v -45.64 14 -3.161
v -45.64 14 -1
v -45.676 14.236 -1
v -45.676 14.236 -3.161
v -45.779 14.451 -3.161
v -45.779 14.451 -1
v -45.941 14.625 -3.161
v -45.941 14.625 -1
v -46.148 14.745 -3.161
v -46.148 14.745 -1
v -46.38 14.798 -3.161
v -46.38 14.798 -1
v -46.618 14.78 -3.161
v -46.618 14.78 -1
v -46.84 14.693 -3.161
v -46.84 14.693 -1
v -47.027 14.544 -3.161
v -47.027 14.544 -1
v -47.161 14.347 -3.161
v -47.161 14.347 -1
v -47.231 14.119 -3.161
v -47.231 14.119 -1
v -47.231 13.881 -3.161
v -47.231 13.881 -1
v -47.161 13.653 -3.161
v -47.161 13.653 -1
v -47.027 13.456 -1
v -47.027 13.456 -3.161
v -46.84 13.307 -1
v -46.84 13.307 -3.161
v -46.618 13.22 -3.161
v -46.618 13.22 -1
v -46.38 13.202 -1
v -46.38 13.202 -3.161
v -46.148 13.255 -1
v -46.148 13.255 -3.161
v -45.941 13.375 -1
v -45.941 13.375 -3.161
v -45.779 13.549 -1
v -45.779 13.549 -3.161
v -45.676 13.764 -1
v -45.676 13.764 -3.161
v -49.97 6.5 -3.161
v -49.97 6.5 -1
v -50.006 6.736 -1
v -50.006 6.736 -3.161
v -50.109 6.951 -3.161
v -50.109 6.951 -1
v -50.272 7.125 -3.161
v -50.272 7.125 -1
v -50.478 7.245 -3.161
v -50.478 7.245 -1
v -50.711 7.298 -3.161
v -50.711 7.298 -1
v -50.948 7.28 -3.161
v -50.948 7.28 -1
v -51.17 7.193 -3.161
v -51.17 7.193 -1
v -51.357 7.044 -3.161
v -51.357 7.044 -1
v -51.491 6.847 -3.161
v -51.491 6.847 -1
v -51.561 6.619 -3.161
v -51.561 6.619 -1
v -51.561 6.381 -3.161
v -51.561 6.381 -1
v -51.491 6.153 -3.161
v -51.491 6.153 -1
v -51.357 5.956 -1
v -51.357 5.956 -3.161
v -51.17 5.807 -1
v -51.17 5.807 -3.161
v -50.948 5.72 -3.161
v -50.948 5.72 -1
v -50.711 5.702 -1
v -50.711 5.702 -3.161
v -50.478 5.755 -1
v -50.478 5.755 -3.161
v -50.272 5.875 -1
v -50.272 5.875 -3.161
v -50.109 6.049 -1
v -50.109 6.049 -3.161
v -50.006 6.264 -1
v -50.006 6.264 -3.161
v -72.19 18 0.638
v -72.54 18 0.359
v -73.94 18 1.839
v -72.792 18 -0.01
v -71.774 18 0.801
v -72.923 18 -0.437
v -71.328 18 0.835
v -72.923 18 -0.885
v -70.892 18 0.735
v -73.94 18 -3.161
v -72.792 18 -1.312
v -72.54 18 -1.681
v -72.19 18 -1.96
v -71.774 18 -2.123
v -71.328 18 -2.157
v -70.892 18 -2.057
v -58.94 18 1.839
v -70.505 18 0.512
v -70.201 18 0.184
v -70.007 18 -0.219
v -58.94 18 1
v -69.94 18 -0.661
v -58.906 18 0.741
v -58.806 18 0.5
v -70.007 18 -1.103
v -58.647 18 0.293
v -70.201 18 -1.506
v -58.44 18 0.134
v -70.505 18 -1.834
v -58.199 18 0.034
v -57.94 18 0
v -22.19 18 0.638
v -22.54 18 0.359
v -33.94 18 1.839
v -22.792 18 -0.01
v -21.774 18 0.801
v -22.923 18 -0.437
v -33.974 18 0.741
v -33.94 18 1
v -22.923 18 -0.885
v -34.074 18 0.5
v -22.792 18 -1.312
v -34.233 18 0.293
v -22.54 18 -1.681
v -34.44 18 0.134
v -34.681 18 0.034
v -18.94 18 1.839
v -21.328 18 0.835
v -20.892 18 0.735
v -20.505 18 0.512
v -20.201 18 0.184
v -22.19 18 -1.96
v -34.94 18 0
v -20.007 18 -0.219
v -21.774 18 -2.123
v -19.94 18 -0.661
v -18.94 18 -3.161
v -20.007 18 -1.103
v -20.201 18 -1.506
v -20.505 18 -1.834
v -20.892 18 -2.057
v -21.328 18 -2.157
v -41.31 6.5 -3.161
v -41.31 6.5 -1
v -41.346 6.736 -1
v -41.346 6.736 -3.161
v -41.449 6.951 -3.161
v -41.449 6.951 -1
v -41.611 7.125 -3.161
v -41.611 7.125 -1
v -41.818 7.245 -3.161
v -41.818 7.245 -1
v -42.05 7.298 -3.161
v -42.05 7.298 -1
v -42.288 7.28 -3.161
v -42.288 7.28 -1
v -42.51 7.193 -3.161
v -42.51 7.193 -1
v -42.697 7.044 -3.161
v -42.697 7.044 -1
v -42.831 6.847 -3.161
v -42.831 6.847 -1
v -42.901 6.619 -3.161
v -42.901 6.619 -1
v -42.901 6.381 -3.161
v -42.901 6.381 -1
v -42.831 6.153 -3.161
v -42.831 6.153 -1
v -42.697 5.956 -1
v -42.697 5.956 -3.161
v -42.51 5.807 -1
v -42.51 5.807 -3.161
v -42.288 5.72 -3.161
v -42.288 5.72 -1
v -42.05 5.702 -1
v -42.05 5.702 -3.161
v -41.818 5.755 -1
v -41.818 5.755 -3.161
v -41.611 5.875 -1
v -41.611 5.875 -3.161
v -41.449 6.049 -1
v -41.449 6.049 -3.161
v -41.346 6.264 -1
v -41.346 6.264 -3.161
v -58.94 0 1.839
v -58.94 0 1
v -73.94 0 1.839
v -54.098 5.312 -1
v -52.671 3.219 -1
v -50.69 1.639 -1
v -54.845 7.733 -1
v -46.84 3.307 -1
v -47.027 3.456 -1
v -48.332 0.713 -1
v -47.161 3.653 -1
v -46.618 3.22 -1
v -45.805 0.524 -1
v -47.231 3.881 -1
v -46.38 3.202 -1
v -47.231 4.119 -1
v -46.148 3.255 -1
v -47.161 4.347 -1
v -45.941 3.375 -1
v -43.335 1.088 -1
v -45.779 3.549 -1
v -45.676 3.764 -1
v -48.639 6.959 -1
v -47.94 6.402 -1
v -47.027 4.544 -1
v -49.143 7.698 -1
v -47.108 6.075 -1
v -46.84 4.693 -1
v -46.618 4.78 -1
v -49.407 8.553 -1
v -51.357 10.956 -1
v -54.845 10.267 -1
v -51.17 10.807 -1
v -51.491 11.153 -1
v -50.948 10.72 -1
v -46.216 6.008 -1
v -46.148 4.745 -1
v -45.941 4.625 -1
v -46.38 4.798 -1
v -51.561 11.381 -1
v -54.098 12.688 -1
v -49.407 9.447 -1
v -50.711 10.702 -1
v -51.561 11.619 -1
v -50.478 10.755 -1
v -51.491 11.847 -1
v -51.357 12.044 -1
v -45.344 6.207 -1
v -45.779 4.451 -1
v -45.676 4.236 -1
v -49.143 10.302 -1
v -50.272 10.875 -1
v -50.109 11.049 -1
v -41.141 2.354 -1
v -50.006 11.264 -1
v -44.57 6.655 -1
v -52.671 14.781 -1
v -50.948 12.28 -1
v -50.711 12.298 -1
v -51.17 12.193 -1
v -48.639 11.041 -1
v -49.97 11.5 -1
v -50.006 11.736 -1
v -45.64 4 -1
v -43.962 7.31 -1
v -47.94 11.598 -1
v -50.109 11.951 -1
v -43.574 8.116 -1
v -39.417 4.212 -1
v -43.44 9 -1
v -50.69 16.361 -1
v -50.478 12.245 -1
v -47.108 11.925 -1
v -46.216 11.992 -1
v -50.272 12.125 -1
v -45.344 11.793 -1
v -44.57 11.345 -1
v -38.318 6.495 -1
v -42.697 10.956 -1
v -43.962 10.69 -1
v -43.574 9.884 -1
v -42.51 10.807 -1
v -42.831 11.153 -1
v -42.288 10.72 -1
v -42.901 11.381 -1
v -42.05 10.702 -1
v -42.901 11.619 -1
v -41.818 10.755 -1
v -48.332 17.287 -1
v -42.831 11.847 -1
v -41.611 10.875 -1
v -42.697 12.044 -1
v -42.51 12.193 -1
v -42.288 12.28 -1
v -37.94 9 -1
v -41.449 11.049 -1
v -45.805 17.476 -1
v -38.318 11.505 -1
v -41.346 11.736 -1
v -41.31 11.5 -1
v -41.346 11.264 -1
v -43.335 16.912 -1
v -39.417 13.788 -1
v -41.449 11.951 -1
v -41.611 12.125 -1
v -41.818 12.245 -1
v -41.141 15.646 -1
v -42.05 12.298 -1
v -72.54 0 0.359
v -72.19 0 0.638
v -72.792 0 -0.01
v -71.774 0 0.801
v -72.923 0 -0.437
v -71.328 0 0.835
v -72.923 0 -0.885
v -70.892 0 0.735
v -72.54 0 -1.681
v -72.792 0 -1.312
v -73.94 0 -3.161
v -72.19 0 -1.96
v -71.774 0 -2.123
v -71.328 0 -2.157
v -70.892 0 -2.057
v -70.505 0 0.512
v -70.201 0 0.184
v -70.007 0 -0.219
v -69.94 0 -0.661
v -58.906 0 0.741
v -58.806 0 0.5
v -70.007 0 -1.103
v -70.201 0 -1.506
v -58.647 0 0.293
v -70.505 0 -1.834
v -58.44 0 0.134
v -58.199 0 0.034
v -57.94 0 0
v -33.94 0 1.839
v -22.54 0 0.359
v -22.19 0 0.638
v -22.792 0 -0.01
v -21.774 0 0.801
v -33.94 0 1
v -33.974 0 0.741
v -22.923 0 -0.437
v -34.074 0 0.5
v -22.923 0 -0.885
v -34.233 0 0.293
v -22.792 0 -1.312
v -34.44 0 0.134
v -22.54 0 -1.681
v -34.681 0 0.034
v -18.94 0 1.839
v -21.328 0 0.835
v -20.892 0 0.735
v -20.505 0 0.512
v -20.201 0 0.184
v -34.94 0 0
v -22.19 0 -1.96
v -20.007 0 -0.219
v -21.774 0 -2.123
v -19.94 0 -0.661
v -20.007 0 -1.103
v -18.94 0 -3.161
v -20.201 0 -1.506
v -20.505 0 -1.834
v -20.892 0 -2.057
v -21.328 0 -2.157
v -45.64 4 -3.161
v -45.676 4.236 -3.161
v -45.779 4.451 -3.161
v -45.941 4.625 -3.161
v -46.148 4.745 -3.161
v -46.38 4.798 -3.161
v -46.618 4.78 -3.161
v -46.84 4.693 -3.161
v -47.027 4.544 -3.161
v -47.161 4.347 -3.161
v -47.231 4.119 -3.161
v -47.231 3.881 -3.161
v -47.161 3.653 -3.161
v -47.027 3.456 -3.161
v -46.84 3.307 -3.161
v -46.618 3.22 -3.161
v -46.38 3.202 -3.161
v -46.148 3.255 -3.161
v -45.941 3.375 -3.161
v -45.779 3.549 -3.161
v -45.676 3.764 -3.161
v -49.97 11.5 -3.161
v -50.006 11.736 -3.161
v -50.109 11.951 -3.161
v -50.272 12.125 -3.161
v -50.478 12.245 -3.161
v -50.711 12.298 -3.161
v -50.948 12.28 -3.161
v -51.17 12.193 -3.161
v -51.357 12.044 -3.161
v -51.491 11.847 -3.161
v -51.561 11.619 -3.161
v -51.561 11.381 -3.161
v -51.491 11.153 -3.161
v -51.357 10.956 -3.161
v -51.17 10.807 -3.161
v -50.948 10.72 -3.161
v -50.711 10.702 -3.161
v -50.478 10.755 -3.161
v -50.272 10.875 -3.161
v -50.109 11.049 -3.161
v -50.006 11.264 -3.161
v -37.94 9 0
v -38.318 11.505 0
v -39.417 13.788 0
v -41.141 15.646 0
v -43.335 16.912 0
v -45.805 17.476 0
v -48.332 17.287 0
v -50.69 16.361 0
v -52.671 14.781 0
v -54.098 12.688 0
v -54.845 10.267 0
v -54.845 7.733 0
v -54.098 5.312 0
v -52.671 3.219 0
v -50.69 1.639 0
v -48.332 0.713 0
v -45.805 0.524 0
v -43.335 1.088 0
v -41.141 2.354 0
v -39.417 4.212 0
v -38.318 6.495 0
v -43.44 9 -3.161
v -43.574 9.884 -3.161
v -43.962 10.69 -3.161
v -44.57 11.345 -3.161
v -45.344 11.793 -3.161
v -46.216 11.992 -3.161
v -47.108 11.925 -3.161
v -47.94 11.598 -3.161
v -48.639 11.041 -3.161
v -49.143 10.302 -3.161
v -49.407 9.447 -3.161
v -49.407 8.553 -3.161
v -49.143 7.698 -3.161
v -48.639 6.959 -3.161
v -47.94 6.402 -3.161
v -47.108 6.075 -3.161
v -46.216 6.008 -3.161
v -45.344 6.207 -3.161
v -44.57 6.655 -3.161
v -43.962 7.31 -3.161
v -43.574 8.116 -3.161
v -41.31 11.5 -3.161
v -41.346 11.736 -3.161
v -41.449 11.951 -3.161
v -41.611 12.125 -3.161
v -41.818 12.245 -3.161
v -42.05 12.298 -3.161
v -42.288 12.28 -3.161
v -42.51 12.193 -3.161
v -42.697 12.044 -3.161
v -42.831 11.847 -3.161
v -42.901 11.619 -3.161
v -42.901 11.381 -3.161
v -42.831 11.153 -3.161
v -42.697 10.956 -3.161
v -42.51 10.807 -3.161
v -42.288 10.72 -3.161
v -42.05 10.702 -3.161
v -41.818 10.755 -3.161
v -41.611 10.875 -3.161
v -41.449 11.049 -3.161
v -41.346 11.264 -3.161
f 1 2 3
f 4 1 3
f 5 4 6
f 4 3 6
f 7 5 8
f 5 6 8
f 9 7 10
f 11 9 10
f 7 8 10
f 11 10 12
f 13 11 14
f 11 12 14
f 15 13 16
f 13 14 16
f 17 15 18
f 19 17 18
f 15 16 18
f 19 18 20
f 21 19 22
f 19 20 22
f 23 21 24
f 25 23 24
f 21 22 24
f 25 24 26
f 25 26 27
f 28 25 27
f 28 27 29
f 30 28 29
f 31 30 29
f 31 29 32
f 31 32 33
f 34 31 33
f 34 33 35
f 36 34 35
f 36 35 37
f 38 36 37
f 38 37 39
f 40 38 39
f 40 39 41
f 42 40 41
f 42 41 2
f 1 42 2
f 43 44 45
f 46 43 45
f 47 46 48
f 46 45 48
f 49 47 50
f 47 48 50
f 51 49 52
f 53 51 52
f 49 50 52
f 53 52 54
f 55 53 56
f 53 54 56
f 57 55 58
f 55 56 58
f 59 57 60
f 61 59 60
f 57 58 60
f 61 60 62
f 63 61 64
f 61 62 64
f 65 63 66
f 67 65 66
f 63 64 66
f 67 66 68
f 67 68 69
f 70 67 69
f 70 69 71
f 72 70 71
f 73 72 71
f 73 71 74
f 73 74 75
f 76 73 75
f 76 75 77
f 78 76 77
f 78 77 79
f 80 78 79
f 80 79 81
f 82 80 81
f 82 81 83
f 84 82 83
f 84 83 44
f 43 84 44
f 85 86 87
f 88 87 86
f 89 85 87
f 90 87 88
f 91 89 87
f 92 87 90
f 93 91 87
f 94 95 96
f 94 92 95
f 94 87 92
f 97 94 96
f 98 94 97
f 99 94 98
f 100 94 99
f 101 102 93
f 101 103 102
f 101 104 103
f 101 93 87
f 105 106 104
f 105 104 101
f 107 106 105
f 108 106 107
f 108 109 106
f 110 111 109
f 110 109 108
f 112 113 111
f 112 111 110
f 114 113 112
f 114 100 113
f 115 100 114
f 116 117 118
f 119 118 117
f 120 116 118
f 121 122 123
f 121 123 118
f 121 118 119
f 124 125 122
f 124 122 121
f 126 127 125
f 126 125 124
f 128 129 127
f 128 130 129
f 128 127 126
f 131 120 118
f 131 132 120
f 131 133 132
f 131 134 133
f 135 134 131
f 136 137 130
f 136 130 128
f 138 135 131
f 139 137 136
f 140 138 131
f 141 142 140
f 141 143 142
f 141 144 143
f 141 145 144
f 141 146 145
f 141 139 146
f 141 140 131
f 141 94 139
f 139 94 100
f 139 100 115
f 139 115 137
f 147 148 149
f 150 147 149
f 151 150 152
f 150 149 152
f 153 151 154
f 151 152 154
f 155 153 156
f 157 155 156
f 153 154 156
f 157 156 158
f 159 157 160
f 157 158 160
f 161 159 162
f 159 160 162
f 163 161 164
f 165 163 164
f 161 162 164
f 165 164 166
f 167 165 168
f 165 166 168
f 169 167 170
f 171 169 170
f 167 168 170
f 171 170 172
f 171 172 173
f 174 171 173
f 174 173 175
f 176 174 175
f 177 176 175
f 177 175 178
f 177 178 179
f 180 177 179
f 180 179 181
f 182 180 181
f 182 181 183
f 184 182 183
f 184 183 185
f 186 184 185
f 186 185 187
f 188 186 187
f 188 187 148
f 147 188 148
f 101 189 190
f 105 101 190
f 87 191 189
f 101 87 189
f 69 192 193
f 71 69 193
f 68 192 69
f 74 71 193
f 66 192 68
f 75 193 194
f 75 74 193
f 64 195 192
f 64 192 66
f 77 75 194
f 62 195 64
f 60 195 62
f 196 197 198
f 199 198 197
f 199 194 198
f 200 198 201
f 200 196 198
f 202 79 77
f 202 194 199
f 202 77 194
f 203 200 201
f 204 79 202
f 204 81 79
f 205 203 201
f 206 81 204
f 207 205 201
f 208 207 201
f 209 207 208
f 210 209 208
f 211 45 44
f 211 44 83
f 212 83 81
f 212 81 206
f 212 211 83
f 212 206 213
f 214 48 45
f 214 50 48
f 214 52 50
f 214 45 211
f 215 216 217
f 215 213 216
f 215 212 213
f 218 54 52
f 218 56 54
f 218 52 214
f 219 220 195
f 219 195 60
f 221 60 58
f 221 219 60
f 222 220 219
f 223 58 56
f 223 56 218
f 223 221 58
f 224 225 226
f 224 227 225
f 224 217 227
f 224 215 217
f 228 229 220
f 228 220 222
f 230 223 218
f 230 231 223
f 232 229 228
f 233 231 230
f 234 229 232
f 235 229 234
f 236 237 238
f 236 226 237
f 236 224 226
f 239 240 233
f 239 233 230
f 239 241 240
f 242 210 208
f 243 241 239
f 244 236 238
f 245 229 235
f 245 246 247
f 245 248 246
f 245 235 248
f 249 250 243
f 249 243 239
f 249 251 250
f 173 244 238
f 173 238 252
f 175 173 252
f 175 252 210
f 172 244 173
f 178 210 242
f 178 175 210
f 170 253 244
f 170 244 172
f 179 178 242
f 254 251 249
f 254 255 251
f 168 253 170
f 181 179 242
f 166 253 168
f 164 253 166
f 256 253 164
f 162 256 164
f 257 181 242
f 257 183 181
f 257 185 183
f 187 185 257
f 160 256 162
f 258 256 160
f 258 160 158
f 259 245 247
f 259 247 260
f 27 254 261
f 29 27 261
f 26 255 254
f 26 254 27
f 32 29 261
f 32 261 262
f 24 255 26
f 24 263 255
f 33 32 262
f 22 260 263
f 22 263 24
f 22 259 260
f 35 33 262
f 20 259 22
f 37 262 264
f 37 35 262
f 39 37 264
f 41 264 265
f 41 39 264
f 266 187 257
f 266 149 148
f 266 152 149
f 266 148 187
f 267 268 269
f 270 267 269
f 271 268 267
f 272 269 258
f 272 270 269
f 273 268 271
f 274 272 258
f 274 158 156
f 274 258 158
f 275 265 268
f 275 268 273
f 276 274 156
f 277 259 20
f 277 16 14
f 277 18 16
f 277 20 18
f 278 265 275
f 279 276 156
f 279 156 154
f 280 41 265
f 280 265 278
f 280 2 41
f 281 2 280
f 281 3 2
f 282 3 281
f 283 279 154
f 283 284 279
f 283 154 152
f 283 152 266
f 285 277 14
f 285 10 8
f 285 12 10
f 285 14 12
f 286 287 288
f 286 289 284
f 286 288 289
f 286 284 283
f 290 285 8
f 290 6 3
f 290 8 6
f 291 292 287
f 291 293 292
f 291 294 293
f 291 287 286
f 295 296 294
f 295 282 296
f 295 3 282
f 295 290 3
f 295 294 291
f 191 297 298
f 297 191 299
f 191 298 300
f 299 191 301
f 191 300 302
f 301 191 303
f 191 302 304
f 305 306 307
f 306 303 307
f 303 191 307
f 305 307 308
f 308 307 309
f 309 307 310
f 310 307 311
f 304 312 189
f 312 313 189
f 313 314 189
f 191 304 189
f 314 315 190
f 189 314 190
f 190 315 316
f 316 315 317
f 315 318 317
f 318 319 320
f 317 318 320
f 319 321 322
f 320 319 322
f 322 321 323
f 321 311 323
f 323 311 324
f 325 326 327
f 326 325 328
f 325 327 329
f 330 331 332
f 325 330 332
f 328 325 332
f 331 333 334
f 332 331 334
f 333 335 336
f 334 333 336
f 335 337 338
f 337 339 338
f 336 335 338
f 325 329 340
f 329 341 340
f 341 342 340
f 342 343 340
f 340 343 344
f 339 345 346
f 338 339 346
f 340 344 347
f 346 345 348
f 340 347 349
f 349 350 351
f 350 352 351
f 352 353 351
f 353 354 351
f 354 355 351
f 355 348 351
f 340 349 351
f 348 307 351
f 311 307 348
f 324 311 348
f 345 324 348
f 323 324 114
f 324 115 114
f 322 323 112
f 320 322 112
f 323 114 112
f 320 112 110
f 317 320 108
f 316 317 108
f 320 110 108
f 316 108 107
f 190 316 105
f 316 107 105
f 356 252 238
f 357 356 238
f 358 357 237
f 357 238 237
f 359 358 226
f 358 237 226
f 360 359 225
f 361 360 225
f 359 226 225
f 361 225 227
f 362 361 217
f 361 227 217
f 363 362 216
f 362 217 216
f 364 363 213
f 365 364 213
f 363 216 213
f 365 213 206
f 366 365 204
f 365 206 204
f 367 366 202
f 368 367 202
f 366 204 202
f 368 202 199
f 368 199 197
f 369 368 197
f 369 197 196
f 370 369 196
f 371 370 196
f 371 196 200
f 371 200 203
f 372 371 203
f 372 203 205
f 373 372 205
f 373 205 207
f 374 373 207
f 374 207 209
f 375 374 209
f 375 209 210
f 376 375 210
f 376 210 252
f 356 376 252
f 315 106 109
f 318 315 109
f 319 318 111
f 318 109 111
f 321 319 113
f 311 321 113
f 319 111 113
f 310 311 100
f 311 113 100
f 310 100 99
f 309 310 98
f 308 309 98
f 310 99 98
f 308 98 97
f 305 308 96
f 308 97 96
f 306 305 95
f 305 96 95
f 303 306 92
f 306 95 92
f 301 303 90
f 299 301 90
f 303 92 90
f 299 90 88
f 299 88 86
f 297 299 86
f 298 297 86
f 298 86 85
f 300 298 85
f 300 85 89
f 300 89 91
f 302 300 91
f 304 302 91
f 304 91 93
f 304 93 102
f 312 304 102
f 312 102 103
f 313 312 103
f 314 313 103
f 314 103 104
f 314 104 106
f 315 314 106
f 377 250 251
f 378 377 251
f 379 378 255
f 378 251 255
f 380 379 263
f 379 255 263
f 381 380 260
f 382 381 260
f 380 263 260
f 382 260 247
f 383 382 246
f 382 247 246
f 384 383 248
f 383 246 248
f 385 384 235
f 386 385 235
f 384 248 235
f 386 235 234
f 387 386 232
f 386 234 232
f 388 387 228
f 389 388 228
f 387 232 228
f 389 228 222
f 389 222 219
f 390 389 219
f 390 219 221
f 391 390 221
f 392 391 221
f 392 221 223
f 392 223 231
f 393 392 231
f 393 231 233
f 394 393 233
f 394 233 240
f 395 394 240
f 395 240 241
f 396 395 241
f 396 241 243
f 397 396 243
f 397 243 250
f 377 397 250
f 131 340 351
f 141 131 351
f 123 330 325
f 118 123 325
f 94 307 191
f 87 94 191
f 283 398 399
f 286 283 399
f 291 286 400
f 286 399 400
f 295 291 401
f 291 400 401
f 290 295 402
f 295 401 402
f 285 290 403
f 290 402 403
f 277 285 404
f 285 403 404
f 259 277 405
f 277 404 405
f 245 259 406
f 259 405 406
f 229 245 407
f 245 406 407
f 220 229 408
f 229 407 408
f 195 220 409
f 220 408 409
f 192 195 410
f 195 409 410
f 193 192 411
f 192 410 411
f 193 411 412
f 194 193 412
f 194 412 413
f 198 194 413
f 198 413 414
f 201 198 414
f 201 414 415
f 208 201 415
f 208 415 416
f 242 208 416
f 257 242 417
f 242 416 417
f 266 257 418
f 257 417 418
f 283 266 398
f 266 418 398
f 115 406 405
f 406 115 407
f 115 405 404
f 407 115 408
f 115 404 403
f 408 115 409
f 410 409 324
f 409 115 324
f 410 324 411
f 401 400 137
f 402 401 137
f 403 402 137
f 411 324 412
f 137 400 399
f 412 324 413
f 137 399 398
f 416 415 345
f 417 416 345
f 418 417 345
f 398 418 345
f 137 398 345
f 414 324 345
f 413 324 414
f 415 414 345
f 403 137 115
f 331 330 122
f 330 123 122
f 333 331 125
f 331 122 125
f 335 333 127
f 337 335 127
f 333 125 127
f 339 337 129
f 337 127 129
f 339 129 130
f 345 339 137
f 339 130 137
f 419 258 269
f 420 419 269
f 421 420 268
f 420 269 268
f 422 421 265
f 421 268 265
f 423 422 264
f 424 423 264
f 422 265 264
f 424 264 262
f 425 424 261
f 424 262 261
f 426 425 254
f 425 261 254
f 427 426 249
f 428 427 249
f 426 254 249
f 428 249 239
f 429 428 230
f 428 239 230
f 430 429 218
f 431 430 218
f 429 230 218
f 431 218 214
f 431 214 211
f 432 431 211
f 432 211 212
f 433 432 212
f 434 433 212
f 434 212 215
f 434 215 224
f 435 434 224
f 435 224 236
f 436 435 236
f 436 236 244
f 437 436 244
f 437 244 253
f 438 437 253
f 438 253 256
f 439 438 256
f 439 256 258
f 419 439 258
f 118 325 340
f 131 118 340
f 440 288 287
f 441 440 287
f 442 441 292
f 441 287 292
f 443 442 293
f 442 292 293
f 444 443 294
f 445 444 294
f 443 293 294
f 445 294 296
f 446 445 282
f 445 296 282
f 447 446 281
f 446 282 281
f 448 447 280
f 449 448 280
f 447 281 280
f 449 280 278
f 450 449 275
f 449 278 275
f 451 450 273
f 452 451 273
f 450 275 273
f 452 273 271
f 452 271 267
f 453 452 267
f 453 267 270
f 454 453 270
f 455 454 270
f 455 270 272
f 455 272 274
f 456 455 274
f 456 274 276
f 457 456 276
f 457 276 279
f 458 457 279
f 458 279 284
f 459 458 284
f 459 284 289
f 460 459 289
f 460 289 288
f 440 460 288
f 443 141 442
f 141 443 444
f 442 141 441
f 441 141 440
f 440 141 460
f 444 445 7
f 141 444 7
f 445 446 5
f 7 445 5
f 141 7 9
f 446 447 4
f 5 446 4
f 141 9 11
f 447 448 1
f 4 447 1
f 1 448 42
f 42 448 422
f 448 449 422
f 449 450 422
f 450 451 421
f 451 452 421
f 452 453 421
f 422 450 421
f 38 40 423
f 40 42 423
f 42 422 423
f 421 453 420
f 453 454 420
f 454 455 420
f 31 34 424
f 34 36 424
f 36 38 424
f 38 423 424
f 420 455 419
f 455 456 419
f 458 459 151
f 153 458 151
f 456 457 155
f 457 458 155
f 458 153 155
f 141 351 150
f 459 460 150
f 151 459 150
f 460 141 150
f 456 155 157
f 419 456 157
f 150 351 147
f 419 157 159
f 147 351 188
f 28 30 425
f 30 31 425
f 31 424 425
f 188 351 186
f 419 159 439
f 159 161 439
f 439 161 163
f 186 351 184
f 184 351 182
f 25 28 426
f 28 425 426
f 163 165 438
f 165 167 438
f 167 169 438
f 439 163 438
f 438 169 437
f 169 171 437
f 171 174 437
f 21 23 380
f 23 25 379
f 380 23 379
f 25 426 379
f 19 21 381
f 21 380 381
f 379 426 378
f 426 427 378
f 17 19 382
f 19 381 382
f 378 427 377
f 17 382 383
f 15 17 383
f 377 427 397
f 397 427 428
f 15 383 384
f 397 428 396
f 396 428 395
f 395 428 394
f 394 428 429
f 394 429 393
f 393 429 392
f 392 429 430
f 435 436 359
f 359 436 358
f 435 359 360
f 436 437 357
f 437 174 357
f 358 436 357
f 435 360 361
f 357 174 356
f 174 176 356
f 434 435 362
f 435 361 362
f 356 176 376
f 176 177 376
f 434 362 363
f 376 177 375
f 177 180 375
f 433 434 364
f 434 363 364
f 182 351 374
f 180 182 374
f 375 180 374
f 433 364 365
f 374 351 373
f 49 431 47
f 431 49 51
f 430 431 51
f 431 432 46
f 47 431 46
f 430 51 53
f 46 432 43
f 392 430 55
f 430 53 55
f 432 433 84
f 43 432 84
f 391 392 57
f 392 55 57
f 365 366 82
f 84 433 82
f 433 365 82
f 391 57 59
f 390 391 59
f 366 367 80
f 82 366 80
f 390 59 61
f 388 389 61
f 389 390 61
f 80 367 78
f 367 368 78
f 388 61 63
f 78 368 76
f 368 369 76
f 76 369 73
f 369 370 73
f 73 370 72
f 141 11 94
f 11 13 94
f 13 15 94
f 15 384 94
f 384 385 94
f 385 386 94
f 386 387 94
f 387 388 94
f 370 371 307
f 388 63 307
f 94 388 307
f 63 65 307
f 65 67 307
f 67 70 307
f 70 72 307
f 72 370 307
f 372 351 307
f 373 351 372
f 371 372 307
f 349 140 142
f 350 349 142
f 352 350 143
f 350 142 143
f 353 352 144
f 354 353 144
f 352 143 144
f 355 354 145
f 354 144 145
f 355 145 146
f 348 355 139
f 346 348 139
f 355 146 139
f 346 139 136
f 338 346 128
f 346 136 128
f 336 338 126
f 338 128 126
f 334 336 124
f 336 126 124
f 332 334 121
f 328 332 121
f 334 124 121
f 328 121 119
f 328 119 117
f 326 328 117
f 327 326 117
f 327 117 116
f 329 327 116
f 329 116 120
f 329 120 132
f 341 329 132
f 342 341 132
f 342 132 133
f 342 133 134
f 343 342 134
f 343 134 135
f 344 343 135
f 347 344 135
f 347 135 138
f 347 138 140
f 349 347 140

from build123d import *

# Parameters (mm, degrees)
BOSS_EXTRUDE1_DEPTH = 18
SKETCH9_R           = 8.5
CUT_EXTRUDE6_DEPTH  = 1
SKETCH10_R          = 3
CUT_EXTRUDE7_DEPTH  = 3.161013299
SKETCH11_R          = 0.8
CUT_EXTRUDE8_DEPTH  = 3.161013299
FILLET1_R           = 1
SKETCH13_R          = 1.5
CUT_EXTRUDE10_DEPTH = 19


with BuildPart() as part:
    # Sketch2 → Boss-Extrude1 (new body)
    with BuildSketch(Plane(origin=(0, 0, 0), x_dir=(1, 0, 0), z_dir=(0, 1, 0))):
        Polygon((-33.940224132, -1.838986701), (-18.940224132, -1.838986701), (-18.940224132, 3.161013299), (-73.940224132, 3.161013299), (-73.940224132, -1.838986701), (-58.940224132, -1.838986701), (-58.940224132, 0), (-33.940224132, 0), align=None)
    extrude(amount=BOSS_EXTRUDE1_DEPTH)

    # Sketch9 → Cut-Extrude6 (cut)
    with BuildSketch(Plane.XY):
        with Locations((-46.440224132, 9)):
            Circle(SKETCH9_R)
    extrude(amount=-CUT_EXTRUDE6_DEPTH, mode=Mode.SUBTRACT)

    # Sketch10 → Cut-Extrude7 (cut, through all)
    with BuildSketch(Plane.XY.offset(-1)):
        with Locations((-46.440224132, 9)):
            Circle(SKETCH10_R)
    extrude(amount=-CUT_EXTRUDE7_DEPTH, mode=Mode.SUBTRACT)

    # Sketch11 → Cut-Extrude8 (cut, through all)
    with BuildSketch(Plane.XY.offset(-1)):
        with Locations((-42.110097113, 11.5)):
            Circle(SKETCH11_R)
        with Locations((-42.110097113, 6.5)):
            Circle(SKETCH11_R)
        with Locations((-46.440224132, 14)):
            Circle(SKETCH11_R)
        with Locations((-46.440224132, 4)):
            Circle(SKETCH11_R)
        with Locations((-50.770351151, 11.5)):
            Circle(SKETCH11_R)
        with Locations((-50.770351151, 6.5)):
            Circle(SKETCH11_R)
    extrude(amount=-CUT_EXTRUDE8_DEPTH, mode=Mode.SUBTRACT)

    # Fillet1
    fillet1_edges = [part.edges().sort_by_distance(p)[0] for p in [
        (-33.940224132, 9, 0),
        (-58.940224132, 9, 0),
    ]]
    fillet(fillet1_edges, radius=FILLET1_R)

    # Sketch13 → Cut-Extrude10 (cut, through all)
    with BuildSketch(Plane(origin=(0, 18, 0), x_dir=(1, 0, 0), z_dir=(0, 1, 0))):
        with Locations((-71.440224132, 0.661013299)):
            Circle(SKETCH13_R)
        with Locations((-21.440224132, 0.661013299)):
            Circle(SKETCH13_R)
    extrude(amount=-CUT_EXTRUDE10_DEPTH, mode=Mode.SUBTRACT)


solid = part.part
